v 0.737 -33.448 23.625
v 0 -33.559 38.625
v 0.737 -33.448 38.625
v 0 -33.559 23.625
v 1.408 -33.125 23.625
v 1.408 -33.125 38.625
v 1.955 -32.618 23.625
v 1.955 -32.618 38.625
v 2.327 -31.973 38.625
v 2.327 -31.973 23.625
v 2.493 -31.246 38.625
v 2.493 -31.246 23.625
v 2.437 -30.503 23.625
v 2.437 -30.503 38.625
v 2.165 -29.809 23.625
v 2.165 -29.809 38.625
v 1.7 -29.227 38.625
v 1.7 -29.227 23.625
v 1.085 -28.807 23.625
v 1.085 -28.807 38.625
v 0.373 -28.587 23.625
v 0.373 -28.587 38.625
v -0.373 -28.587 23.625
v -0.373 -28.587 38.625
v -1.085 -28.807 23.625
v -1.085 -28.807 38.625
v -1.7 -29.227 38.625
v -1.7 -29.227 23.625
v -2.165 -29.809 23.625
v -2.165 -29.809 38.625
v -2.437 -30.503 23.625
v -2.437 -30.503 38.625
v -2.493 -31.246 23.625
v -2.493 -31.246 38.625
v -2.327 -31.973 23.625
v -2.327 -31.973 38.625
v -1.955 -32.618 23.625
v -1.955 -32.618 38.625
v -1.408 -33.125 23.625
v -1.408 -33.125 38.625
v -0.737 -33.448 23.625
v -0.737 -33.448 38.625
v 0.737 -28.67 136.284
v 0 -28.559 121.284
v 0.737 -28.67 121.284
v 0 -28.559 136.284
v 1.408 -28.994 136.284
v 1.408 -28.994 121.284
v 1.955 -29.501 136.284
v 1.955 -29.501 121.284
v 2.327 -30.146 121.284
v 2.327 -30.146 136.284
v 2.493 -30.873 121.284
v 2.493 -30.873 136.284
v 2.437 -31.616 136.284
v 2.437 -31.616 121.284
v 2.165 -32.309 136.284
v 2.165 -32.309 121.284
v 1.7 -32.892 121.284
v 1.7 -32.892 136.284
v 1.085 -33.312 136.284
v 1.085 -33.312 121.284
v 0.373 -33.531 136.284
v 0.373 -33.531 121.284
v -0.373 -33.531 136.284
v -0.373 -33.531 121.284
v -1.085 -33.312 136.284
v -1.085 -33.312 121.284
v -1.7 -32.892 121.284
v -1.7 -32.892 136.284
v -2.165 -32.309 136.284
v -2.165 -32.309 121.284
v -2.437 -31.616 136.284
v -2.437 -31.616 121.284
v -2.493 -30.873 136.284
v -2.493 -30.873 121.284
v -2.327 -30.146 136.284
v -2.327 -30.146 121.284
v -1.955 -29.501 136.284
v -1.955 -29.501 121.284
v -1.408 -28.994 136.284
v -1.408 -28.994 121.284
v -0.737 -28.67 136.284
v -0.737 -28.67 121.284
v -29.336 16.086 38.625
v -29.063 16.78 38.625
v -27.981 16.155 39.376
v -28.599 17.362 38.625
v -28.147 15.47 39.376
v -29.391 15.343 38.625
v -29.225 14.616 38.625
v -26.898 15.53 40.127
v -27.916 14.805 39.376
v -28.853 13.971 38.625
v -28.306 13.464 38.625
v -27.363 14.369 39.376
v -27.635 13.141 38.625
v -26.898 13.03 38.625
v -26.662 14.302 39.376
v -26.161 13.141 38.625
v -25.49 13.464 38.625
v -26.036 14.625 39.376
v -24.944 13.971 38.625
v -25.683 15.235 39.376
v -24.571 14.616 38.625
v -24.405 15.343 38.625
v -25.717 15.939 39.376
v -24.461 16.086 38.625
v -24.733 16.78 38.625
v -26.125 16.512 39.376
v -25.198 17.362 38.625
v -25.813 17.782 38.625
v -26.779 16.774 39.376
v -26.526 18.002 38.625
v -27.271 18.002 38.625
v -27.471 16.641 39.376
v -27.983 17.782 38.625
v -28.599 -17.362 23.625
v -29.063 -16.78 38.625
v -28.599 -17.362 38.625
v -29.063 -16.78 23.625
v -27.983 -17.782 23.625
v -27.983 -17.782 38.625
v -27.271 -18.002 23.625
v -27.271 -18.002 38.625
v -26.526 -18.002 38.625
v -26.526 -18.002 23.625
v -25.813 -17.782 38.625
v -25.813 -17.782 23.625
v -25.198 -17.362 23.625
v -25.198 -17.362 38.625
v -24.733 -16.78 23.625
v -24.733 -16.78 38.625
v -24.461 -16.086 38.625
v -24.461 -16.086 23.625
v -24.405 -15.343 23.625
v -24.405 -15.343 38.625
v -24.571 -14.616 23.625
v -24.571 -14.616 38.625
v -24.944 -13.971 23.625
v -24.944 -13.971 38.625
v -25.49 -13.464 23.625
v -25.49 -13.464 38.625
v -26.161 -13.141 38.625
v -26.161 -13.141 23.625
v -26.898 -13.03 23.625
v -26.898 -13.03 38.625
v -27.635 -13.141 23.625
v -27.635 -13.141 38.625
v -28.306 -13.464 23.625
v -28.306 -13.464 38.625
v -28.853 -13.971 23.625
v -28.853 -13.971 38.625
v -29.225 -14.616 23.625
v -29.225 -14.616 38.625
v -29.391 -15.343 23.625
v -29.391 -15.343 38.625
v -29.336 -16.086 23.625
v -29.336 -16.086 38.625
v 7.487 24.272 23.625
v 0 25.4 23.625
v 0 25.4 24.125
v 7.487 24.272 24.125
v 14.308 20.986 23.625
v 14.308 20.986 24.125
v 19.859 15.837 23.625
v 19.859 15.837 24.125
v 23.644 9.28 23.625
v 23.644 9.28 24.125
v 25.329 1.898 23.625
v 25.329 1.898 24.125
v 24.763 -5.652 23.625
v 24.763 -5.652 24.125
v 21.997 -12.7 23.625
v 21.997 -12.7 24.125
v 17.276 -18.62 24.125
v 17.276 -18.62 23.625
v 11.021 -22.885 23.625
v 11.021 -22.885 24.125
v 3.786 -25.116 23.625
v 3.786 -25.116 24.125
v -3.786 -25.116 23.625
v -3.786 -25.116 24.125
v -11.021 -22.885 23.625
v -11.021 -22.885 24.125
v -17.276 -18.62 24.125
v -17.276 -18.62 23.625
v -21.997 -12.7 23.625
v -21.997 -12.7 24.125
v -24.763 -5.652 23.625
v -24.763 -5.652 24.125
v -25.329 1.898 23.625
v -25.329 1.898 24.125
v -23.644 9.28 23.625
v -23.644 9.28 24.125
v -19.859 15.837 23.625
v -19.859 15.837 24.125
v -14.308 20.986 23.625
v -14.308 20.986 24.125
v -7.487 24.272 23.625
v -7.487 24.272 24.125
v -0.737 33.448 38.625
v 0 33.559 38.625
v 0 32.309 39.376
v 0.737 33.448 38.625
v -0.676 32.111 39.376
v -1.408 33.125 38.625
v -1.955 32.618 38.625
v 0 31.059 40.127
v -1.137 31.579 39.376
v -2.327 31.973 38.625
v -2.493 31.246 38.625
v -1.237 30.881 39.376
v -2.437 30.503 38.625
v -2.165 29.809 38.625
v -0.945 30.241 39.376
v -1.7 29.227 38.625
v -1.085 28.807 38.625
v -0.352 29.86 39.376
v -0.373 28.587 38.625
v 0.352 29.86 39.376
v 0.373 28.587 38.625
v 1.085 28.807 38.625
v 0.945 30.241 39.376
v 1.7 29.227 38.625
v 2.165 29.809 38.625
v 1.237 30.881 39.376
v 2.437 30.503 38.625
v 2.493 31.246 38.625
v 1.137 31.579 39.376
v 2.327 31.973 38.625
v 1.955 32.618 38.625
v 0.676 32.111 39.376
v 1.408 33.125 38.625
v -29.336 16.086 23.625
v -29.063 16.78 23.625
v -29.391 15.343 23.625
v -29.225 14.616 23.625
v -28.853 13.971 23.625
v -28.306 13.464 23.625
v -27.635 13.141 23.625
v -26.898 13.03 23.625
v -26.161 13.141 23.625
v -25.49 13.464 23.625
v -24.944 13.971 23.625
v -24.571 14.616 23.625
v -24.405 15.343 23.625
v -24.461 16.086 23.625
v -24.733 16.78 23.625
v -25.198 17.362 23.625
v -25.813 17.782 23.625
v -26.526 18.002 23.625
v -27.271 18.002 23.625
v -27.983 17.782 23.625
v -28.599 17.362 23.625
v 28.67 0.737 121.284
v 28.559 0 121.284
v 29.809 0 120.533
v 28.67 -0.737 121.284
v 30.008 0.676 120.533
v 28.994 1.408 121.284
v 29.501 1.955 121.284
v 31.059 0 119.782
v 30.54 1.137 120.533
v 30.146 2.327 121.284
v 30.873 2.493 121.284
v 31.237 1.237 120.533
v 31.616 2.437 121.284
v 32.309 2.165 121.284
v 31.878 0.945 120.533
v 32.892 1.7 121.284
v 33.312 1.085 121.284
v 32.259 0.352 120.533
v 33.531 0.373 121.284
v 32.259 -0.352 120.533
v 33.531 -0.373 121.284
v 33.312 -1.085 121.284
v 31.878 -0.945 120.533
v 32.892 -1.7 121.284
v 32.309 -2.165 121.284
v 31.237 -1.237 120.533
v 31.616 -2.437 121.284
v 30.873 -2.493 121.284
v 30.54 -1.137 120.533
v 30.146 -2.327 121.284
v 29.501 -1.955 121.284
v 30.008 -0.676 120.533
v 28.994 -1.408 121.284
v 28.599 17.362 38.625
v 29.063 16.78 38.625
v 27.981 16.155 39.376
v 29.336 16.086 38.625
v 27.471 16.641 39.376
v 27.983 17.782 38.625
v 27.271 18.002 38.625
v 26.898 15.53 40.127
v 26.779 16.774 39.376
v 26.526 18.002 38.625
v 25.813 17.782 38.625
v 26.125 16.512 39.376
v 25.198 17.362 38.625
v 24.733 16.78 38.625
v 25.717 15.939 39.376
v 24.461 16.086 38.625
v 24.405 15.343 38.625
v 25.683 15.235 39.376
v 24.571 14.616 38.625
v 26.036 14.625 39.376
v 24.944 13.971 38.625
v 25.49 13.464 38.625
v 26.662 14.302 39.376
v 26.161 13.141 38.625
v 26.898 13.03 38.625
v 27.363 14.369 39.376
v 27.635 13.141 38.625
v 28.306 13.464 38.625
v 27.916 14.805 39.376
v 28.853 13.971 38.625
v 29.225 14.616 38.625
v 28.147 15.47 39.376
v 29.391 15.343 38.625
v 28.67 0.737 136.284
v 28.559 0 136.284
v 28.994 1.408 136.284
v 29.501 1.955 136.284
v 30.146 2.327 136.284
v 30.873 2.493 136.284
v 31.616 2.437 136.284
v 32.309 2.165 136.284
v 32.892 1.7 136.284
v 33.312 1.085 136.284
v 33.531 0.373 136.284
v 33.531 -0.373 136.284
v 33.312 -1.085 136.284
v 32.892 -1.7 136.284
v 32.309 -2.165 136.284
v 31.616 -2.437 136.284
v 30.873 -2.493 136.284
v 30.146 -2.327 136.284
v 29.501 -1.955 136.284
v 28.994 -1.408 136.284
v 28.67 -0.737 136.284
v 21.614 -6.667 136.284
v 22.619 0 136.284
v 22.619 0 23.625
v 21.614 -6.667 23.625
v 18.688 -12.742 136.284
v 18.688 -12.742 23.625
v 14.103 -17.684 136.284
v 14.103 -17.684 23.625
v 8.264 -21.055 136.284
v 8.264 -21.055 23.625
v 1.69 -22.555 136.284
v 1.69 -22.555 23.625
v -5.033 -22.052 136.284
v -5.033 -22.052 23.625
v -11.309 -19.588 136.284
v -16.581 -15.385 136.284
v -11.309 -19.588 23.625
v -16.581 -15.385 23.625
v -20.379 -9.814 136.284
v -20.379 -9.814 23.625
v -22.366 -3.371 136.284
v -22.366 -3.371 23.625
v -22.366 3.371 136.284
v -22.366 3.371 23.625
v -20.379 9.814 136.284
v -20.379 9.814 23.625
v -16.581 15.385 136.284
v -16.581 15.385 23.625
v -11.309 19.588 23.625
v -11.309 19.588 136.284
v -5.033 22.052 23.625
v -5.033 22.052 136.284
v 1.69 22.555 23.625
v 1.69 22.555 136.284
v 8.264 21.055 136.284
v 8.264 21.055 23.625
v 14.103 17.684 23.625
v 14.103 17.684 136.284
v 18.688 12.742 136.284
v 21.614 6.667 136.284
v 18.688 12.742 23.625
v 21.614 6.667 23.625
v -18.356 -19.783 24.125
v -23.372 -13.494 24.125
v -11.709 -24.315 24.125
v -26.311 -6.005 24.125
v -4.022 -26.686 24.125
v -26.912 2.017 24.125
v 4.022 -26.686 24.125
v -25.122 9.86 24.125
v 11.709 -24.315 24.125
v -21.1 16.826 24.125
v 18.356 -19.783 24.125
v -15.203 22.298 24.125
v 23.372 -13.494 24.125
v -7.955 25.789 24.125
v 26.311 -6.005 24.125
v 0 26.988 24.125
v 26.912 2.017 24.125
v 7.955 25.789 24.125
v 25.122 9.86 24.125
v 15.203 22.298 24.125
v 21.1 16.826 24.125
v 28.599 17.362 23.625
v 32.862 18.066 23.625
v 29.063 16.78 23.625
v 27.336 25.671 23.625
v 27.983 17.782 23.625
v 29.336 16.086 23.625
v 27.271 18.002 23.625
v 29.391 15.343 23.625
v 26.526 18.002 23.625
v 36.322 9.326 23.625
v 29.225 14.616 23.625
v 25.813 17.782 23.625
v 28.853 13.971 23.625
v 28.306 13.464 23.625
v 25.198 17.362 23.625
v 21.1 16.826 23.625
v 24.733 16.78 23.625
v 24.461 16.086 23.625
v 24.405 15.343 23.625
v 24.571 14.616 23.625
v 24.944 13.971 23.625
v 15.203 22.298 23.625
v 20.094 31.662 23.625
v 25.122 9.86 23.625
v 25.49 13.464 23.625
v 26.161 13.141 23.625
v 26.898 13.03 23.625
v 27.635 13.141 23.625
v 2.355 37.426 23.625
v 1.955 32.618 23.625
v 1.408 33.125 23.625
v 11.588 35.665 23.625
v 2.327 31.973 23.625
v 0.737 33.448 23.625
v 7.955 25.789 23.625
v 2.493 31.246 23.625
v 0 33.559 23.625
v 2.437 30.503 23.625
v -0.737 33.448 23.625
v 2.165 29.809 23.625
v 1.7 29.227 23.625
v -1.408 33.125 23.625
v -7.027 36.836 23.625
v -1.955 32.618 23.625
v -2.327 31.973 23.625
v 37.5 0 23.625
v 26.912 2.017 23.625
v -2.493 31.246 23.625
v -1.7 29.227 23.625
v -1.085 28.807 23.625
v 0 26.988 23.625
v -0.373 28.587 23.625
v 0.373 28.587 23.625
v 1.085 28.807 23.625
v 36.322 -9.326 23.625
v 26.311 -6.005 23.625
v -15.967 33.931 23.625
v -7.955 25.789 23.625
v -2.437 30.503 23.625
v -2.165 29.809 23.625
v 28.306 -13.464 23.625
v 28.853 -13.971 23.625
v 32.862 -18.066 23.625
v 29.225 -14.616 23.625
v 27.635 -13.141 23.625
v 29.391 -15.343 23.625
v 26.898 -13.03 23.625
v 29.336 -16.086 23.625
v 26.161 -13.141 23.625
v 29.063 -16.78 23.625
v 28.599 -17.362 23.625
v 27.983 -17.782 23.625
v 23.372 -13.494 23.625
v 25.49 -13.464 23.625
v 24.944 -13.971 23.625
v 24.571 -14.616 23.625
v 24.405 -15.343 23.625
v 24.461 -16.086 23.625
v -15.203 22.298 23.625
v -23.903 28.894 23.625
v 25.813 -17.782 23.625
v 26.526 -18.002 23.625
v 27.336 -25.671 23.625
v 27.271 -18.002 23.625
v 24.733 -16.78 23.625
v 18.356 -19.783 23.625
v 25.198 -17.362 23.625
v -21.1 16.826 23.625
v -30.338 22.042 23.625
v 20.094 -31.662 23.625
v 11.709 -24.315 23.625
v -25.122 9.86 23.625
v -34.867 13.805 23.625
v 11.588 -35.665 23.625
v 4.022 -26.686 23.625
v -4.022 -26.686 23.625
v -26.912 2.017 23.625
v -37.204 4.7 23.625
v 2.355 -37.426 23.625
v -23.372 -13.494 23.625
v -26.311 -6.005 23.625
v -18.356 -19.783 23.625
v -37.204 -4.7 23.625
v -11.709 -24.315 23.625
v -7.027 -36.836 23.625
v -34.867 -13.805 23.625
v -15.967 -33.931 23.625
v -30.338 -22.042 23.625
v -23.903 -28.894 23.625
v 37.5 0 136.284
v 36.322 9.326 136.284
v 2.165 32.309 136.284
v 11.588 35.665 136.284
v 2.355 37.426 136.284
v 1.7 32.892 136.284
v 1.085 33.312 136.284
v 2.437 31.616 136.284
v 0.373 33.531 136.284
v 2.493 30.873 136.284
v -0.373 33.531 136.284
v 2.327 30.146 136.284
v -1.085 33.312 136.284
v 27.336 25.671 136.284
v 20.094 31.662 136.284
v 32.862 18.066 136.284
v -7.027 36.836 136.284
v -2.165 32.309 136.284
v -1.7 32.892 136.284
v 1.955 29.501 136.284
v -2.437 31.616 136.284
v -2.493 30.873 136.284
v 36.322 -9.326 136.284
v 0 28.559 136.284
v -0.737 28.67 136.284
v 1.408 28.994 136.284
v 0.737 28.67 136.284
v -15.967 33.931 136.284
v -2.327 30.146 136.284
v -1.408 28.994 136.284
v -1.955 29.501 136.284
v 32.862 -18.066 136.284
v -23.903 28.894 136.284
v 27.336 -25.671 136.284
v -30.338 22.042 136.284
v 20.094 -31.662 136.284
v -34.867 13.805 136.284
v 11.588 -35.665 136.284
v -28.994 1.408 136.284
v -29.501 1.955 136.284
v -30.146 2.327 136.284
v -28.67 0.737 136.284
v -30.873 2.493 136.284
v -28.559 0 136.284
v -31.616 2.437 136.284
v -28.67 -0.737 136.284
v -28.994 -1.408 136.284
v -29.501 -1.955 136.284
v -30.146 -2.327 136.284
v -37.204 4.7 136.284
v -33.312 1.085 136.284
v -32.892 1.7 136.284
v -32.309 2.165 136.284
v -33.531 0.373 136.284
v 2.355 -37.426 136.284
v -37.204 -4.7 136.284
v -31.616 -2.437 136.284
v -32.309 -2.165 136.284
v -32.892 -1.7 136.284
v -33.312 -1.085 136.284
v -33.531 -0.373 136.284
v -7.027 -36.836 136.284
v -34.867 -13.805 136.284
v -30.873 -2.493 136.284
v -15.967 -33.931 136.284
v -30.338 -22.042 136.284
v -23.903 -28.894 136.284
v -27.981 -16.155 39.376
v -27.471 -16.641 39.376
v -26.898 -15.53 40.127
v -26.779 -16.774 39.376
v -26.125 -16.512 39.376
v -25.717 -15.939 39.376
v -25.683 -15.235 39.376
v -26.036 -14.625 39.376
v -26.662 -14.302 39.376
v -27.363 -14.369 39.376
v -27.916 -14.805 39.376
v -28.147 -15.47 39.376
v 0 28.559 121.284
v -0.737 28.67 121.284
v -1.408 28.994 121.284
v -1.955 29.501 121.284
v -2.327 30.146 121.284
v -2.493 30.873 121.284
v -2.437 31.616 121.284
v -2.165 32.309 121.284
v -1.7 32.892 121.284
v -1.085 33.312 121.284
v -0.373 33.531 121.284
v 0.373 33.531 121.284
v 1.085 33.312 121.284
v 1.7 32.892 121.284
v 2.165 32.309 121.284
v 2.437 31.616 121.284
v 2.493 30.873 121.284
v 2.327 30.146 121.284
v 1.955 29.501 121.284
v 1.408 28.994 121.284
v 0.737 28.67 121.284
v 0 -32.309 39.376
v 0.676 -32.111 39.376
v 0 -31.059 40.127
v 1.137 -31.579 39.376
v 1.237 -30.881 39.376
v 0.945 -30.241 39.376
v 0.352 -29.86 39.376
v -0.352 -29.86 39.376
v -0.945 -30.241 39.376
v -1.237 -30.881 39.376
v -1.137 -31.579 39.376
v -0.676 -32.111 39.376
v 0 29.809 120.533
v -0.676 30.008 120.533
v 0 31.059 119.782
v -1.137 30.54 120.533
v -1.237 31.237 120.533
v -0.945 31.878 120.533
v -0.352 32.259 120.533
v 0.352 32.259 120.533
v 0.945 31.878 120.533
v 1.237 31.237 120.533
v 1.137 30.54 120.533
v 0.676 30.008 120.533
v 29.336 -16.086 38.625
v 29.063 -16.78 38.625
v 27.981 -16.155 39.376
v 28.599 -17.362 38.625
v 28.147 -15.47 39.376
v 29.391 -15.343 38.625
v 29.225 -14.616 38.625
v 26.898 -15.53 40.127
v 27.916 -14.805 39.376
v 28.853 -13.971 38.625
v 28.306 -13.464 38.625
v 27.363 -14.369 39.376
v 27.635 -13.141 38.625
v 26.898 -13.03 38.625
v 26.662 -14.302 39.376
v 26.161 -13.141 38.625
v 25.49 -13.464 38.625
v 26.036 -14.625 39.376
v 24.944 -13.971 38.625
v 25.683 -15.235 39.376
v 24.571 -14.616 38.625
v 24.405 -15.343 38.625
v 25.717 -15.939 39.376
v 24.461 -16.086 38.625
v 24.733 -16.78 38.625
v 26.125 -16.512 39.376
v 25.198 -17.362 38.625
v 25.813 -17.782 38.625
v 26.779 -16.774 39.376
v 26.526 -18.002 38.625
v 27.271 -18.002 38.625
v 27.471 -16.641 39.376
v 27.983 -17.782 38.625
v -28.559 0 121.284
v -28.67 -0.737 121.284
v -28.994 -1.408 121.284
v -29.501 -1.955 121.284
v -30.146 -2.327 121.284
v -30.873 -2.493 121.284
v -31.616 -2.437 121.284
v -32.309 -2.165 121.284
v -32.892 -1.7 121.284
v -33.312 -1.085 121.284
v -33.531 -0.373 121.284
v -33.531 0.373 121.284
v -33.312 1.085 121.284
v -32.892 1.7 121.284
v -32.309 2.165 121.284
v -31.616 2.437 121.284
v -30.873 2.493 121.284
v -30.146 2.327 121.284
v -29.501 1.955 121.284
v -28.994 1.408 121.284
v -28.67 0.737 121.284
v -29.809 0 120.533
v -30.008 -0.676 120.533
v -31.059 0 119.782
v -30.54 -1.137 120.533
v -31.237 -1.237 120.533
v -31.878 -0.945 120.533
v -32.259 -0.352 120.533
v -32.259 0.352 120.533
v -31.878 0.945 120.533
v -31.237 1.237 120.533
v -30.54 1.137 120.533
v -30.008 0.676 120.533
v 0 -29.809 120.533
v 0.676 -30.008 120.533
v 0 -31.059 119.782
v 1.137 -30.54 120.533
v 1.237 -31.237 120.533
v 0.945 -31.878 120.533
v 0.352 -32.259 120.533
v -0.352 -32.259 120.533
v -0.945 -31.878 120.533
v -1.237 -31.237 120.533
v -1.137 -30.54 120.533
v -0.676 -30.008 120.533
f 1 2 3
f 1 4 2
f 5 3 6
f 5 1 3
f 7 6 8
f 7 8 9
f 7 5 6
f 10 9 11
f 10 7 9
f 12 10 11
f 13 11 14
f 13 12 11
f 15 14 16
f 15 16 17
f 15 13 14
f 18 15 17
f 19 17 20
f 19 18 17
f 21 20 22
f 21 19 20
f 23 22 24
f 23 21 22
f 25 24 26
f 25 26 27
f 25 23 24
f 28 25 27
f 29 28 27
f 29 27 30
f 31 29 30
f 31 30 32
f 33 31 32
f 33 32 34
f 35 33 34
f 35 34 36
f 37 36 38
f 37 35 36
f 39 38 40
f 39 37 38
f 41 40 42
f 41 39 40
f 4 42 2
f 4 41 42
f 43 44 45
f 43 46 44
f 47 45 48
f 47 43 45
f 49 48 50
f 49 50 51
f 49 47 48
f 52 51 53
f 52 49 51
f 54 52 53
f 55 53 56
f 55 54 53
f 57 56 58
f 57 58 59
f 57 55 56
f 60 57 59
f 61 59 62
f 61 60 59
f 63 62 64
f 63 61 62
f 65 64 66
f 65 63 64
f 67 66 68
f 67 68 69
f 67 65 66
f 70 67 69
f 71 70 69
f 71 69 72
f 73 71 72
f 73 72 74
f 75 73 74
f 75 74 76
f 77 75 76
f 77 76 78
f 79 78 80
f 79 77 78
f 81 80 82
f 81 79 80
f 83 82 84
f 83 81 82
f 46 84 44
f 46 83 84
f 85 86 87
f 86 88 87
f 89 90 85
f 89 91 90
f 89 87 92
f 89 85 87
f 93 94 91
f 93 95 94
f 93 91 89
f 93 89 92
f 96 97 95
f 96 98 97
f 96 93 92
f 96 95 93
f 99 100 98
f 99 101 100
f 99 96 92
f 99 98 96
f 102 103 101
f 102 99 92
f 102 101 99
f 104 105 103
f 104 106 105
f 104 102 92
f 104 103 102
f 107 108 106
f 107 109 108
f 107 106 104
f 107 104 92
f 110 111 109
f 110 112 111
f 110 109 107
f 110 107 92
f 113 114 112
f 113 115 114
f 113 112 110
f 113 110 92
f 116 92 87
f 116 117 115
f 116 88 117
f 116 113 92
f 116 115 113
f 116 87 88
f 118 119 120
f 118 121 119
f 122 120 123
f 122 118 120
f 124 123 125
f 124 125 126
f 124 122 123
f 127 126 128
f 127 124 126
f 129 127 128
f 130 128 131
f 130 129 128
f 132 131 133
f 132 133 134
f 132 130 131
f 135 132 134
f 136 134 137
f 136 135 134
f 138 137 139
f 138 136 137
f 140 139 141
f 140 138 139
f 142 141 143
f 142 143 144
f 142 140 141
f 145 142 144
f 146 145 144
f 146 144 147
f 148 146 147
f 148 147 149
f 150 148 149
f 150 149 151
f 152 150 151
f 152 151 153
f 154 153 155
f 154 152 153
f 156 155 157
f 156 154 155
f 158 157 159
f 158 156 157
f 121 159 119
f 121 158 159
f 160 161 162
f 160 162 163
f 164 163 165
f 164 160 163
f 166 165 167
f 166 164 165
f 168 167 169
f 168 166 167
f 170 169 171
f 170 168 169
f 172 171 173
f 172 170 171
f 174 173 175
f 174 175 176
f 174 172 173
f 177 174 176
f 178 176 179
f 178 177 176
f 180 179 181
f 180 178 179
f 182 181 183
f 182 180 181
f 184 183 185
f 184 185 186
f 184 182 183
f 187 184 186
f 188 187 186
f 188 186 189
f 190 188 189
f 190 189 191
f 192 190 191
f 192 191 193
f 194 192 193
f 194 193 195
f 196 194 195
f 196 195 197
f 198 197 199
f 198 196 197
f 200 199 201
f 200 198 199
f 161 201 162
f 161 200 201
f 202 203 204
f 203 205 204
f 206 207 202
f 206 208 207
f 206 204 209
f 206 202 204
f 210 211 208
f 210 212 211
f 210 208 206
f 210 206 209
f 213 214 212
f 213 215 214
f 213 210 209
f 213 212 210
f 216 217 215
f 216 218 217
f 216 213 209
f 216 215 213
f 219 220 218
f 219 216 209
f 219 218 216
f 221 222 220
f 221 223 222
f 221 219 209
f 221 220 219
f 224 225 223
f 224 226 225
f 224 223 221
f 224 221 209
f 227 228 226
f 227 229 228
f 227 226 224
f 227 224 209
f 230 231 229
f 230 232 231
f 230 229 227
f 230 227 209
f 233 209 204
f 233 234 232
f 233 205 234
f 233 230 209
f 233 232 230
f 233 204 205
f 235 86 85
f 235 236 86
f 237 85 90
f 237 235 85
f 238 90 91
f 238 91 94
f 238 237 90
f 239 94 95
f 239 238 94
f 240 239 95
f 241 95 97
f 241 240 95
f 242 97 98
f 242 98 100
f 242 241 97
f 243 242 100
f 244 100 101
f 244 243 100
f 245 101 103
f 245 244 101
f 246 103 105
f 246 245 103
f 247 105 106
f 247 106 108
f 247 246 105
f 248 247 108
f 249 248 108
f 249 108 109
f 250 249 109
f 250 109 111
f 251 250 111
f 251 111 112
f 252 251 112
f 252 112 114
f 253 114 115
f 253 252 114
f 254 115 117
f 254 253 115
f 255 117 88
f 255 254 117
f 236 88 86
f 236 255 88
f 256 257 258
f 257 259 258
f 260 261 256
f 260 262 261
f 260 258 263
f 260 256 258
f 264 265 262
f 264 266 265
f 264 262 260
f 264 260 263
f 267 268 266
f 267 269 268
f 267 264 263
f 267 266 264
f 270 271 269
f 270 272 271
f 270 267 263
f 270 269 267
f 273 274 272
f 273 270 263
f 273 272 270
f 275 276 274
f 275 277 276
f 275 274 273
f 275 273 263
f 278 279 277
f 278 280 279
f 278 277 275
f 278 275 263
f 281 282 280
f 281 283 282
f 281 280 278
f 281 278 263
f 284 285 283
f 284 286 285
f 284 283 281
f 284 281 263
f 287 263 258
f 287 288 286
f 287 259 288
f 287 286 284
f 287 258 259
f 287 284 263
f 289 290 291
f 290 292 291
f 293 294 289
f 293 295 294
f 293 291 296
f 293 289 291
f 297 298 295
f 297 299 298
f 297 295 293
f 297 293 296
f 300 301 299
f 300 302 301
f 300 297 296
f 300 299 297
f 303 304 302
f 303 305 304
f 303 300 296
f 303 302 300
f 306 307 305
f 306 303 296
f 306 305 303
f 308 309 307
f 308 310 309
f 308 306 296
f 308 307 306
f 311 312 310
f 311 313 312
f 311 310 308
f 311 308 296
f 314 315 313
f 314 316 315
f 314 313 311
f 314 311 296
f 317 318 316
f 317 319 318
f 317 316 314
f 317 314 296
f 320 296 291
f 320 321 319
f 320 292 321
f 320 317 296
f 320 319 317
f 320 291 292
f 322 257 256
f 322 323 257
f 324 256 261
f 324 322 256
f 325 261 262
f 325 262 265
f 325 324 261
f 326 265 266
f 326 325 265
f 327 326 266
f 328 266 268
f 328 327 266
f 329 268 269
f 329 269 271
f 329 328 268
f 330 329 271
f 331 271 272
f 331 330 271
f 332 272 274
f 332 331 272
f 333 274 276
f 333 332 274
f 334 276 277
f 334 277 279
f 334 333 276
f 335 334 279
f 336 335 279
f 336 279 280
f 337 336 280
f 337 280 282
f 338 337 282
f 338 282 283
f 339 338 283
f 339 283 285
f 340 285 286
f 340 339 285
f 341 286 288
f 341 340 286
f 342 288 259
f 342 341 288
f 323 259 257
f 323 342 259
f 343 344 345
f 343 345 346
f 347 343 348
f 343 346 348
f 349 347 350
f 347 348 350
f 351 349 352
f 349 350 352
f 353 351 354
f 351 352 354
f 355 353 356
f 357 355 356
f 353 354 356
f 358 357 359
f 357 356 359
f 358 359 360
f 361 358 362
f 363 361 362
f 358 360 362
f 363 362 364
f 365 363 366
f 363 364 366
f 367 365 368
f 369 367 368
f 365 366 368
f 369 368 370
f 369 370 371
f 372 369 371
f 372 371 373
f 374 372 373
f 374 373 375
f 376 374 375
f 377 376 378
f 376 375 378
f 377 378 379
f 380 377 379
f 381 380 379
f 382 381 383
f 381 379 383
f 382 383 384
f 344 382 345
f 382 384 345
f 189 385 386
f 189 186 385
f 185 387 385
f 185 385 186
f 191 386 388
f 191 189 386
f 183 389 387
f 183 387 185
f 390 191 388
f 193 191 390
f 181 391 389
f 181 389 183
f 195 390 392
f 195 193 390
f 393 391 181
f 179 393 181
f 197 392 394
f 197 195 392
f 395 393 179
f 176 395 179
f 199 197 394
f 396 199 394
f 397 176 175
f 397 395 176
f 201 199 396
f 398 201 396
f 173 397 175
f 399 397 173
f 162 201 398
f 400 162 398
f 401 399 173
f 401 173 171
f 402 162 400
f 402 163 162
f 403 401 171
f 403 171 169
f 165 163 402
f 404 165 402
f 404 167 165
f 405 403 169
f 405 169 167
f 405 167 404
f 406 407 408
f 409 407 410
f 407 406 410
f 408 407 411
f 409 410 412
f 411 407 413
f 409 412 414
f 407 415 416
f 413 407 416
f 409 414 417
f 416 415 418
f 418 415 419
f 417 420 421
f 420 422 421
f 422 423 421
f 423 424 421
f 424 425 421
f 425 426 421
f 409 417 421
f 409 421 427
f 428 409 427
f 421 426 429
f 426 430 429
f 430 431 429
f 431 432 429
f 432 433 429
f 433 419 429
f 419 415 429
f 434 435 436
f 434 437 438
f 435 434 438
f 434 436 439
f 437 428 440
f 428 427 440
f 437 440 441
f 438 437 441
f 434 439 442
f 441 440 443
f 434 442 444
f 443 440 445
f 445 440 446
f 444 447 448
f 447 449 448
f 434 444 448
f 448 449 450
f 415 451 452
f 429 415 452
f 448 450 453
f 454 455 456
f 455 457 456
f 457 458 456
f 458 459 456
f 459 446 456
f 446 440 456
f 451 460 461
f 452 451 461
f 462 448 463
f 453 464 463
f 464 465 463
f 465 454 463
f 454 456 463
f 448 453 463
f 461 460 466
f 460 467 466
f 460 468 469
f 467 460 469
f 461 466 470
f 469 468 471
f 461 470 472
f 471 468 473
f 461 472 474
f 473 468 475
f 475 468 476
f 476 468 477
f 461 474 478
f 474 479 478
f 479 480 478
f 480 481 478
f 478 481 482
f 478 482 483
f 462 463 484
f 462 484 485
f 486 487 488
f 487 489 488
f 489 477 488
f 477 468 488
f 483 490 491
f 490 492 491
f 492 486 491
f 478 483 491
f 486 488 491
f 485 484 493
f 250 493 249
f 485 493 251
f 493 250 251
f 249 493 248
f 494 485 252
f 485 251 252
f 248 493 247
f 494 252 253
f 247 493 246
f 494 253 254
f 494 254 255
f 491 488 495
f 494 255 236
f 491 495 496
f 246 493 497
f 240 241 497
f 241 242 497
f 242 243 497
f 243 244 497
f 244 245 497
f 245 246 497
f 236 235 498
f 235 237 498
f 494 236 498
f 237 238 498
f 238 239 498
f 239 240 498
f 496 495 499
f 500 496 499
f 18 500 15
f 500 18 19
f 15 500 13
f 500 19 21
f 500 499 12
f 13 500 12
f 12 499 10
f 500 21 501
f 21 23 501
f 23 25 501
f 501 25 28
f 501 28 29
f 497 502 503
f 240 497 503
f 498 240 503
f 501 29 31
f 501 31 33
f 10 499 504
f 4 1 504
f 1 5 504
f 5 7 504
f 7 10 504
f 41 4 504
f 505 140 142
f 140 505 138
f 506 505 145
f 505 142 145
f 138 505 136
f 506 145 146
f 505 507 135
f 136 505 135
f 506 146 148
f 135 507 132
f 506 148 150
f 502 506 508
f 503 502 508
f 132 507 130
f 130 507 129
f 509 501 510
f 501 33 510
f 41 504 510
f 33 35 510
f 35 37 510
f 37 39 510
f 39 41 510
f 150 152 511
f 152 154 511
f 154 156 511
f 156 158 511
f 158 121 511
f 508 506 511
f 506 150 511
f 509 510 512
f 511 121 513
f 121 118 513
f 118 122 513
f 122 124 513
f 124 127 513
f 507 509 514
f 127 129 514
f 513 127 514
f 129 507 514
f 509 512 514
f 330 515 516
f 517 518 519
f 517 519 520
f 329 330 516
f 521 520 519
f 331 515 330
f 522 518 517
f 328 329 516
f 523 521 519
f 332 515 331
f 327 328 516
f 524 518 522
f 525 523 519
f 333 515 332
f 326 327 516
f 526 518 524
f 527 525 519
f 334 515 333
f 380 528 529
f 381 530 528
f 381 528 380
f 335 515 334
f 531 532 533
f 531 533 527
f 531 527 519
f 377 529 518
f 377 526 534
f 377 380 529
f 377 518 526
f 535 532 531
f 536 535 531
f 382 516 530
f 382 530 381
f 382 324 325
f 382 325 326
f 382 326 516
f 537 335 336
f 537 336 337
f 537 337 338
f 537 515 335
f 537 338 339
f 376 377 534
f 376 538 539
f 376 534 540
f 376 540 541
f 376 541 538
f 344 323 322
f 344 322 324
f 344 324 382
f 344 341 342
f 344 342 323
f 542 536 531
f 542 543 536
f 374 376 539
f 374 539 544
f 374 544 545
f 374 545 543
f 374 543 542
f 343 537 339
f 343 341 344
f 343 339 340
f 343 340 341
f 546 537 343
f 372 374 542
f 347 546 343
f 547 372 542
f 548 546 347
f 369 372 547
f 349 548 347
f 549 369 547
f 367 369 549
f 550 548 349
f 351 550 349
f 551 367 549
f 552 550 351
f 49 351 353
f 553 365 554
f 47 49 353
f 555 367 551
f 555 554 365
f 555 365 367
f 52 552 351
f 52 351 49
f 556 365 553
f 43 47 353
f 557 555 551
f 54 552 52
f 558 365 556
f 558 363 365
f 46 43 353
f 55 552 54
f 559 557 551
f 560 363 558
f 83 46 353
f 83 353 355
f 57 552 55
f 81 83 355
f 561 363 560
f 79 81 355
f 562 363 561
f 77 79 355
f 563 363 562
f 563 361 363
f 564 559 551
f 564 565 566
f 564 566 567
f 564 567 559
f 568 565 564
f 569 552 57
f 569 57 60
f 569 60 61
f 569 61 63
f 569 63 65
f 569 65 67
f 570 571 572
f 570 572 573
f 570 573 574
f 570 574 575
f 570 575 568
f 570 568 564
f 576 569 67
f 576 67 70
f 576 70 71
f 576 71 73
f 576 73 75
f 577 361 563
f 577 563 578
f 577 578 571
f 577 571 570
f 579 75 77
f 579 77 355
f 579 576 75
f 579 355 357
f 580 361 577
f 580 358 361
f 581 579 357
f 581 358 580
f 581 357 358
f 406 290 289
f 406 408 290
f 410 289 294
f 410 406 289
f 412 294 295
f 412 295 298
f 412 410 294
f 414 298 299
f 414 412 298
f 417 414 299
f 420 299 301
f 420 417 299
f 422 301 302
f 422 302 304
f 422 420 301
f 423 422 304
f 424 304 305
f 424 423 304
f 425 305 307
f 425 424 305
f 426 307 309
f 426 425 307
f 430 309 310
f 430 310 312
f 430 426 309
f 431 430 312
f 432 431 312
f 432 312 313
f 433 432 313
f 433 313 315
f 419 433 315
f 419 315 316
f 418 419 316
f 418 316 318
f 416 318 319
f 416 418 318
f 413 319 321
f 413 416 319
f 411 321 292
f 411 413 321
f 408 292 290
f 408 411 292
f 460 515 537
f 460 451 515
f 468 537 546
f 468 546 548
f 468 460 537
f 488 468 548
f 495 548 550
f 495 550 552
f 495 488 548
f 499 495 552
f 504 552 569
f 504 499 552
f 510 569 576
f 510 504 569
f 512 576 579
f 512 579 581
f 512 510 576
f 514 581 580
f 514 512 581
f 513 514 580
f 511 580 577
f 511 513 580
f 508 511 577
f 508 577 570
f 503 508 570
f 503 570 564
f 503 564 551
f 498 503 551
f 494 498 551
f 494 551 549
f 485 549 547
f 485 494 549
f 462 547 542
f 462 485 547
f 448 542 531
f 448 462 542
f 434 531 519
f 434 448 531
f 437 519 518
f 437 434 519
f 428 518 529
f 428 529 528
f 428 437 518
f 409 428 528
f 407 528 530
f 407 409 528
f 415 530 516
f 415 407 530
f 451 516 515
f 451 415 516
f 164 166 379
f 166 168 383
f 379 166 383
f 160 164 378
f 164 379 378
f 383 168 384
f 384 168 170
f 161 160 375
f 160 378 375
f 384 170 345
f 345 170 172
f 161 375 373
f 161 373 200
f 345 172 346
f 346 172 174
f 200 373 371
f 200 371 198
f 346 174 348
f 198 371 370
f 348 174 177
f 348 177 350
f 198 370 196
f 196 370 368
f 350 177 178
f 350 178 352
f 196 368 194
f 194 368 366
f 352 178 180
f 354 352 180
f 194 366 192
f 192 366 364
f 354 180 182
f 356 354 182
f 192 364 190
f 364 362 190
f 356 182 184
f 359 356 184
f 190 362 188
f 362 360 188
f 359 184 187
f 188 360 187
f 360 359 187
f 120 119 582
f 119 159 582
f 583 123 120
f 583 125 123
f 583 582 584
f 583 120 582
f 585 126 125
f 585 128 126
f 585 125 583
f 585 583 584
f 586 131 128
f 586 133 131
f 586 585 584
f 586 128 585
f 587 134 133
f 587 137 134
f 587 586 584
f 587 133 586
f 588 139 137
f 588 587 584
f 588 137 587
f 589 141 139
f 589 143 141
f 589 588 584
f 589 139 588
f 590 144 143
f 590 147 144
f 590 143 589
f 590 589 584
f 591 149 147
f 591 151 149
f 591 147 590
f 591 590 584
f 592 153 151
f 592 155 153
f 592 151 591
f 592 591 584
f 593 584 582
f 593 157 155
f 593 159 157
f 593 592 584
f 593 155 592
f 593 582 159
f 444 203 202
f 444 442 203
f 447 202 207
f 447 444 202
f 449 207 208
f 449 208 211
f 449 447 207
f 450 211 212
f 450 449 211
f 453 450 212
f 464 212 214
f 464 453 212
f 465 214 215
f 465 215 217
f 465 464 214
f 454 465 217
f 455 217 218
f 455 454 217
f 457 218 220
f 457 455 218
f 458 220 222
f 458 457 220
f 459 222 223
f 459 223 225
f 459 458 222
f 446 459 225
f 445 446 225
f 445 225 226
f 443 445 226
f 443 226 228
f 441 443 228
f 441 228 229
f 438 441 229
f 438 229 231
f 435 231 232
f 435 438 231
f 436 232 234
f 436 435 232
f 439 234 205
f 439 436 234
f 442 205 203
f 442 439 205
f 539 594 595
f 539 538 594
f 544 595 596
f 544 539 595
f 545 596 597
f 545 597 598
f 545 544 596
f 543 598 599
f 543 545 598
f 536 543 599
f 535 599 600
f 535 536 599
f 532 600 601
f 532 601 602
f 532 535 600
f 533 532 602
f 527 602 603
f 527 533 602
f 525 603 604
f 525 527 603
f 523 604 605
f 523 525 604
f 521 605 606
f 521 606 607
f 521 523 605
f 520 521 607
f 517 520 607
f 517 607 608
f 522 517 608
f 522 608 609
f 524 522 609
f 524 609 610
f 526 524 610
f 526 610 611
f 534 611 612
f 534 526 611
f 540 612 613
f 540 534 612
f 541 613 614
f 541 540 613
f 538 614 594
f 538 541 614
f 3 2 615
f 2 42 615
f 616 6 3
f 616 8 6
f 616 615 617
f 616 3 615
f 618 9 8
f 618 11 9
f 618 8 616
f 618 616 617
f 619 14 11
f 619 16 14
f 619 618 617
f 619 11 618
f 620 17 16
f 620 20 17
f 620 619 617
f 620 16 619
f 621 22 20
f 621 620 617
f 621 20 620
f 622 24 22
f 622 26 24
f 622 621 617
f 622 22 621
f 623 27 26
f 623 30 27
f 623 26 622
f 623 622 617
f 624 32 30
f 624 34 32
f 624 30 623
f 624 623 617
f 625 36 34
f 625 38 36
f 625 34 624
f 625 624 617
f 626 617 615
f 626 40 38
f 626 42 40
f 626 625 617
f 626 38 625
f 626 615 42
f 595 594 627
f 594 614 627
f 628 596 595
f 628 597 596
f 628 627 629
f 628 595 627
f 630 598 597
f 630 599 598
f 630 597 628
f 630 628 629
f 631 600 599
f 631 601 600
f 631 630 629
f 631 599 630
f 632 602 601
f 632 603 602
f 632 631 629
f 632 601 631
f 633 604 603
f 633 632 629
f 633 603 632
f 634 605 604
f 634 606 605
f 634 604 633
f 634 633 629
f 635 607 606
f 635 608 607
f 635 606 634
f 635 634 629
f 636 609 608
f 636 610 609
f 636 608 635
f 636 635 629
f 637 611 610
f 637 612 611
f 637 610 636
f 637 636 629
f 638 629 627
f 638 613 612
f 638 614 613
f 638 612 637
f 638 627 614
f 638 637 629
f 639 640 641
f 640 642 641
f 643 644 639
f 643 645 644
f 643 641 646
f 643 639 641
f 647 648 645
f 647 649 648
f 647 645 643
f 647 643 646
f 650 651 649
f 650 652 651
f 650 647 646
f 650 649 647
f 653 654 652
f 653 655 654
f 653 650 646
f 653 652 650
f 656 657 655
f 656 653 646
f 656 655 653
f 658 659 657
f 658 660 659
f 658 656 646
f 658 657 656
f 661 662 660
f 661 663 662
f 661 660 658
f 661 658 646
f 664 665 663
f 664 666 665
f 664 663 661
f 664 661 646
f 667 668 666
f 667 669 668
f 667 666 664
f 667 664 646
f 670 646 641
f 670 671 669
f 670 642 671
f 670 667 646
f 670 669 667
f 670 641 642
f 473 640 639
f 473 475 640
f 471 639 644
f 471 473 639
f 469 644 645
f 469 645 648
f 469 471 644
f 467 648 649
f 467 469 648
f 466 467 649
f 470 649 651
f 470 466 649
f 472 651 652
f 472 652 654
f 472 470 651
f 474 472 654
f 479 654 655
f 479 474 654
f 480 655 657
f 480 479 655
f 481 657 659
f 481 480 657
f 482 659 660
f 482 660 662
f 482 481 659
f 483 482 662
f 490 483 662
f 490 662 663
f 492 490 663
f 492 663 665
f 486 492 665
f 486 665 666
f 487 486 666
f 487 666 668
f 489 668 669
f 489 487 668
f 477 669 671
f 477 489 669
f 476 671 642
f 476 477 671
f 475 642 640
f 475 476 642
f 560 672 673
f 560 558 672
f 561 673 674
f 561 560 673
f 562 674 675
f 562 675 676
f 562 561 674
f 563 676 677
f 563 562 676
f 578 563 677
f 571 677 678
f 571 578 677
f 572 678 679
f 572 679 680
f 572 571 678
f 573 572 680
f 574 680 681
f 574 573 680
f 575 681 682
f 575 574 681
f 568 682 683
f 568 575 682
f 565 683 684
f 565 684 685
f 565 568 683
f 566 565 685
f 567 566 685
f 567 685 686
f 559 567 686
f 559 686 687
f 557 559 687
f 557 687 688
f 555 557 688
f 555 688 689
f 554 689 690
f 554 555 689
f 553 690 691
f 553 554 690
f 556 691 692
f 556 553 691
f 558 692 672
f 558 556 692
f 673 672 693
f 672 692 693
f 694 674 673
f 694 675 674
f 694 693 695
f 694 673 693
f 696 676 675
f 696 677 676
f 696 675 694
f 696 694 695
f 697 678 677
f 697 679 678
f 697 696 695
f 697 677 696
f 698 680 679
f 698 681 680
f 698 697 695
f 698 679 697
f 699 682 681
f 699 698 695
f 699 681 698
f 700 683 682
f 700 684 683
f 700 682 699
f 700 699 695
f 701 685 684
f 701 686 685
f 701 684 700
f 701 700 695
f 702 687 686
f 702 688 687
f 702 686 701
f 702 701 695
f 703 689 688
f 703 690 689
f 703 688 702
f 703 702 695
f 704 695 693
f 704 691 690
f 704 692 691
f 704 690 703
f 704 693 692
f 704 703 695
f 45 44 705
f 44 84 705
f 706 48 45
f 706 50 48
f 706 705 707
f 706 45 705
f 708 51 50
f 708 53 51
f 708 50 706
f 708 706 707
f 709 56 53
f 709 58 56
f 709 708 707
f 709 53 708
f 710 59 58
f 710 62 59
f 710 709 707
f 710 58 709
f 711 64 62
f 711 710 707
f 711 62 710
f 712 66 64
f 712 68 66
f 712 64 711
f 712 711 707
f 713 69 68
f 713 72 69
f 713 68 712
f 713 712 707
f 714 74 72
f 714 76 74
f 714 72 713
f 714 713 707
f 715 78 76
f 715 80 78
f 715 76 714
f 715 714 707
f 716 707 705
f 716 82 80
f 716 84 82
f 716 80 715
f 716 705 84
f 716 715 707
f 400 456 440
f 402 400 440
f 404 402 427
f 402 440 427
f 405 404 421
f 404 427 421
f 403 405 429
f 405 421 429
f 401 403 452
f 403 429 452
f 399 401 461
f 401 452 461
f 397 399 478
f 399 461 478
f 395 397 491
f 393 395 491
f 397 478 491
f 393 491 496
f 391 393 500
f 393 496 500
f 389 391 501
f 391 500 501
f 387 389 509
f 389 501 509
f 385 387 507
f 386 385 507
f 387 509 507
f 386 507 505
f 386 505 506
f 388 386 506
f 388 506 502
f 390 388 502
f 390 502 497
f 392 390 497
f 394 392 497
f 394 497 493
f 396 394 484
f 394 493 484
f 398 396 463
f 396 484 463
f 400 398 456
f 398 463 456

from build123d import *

# Parameters (mm, degrees)
SKETCH1_W              = 112.659
SKETCH1_H              = 14.8813
BACKFACEPATTERN_COUNT  = 6
FRONTFACEPATTERN_COUNT = 4
SKETCH7_R              = 26.9875
SKETCH7_R_2            = 25.4
CUT_EXTRUDE1_DEPTH     = 0.5


with BuildPart() as part:
    # Sketch1 → Revolve1 (revolve)
    with BuildSketch(Plane(origin=(0, 0, 0), x_dir=(0, 0, -1), z_dir=(1, 0, 0)), mode=Mode.PRIVATE) as revolve1_sk:
        with Locations((-79.9545, 30.05935)):
            Rectangle(SKETCH1_W, SKETCH1_H)
    revolve(revolve1_sk.sketch.rotate(Axis((0, 0, 136.284), (0, 0, -1)), 90), axis=Axis((0, 0, 136.284), (0, 0, -1)))

    # Sketch9 → M6x1.0 Tapped Hole3 (revolve, cut)
    with BuildSketch(Plane(origin=(0, 31.05935, 23.625), x_dir=(0, 1, 0), z_dir=(1, 0, 0))):
        Polygon((0, 0), (0, 16.502151548), (2.5, 15), (2.5, 0), align=None)
    m6x1_0_tapped_hole3 = revolve(axis=Axis((0, 31.05935, 17.275), (0, 0, 1)), mode=Mode.SUBTRACT)

    # BackFacePattern: M6x1.0 Tapped Hole3 ×6 about axis
    backfacepattern_axis = Axis((0, 0, 0), (0, 0, 1))
    for i in range(1, BACKFACEPATTERN_COUNT):
        add(m6x1_0_tapped_hole3.rotate(backfacepattern_axis, i * 360 / BACKFACEPATTERN_COUNT), mode=Mode.SUBTRACT)

    # Sketch6 → M6x1.0 Tapped Hole2 (revolve, cut)
    with BuildSketch(Plane(origin=(0, 31.05935, 136.284), x_dir=(0, -1, 0), z_dir=(1, 0, 0))):
        Polygon((0, 0), (0, 16.502151548), (2.5, 15), (2.5, 0), align=None)
    m6x1_0_tapped_hole2 = revolve(axis=Axis((0, 31.05935, 142.634), (0, 0, -1)), mode=Mode.SUBTRACT)

    # FrontFacePattern: M6x1.0 Tapped Hole2 ×4 about axis
    frontfacepattern_axis = Axis((0, 0, 0), (0, 0, 1))
    for i in range(1, FRONTFACEPATTERN_COUNT):
        add(m6x1_0_tapped_hole2.rotate(frontfacepattern_axis, i * 360 / FRONTFACEPATTERN_COUNT), mode=Mode.SUBTRACT)

    # Sketch7 → Cut-Extrude1 (cut)
    with BuildSketch(Plane(origin=(0, 0, 23.625), x_dir=(-1, 0, 0), z_dir=(0, 0, -1))):
        with Locations(Location((0, 0, 0), (0, 0, 90))):
            Circle(SKETCH7_R)
        with Locations(Location((0, 0, 0), (0, 0, 90))):
            Circle(SKETCH7_R_2, mode=Mode.SUBTRACT)
    extrude(amount=-CUT_EXTRUDE1_DEPTH, mode=Mode.SUBTRACT)


solid = part.part
